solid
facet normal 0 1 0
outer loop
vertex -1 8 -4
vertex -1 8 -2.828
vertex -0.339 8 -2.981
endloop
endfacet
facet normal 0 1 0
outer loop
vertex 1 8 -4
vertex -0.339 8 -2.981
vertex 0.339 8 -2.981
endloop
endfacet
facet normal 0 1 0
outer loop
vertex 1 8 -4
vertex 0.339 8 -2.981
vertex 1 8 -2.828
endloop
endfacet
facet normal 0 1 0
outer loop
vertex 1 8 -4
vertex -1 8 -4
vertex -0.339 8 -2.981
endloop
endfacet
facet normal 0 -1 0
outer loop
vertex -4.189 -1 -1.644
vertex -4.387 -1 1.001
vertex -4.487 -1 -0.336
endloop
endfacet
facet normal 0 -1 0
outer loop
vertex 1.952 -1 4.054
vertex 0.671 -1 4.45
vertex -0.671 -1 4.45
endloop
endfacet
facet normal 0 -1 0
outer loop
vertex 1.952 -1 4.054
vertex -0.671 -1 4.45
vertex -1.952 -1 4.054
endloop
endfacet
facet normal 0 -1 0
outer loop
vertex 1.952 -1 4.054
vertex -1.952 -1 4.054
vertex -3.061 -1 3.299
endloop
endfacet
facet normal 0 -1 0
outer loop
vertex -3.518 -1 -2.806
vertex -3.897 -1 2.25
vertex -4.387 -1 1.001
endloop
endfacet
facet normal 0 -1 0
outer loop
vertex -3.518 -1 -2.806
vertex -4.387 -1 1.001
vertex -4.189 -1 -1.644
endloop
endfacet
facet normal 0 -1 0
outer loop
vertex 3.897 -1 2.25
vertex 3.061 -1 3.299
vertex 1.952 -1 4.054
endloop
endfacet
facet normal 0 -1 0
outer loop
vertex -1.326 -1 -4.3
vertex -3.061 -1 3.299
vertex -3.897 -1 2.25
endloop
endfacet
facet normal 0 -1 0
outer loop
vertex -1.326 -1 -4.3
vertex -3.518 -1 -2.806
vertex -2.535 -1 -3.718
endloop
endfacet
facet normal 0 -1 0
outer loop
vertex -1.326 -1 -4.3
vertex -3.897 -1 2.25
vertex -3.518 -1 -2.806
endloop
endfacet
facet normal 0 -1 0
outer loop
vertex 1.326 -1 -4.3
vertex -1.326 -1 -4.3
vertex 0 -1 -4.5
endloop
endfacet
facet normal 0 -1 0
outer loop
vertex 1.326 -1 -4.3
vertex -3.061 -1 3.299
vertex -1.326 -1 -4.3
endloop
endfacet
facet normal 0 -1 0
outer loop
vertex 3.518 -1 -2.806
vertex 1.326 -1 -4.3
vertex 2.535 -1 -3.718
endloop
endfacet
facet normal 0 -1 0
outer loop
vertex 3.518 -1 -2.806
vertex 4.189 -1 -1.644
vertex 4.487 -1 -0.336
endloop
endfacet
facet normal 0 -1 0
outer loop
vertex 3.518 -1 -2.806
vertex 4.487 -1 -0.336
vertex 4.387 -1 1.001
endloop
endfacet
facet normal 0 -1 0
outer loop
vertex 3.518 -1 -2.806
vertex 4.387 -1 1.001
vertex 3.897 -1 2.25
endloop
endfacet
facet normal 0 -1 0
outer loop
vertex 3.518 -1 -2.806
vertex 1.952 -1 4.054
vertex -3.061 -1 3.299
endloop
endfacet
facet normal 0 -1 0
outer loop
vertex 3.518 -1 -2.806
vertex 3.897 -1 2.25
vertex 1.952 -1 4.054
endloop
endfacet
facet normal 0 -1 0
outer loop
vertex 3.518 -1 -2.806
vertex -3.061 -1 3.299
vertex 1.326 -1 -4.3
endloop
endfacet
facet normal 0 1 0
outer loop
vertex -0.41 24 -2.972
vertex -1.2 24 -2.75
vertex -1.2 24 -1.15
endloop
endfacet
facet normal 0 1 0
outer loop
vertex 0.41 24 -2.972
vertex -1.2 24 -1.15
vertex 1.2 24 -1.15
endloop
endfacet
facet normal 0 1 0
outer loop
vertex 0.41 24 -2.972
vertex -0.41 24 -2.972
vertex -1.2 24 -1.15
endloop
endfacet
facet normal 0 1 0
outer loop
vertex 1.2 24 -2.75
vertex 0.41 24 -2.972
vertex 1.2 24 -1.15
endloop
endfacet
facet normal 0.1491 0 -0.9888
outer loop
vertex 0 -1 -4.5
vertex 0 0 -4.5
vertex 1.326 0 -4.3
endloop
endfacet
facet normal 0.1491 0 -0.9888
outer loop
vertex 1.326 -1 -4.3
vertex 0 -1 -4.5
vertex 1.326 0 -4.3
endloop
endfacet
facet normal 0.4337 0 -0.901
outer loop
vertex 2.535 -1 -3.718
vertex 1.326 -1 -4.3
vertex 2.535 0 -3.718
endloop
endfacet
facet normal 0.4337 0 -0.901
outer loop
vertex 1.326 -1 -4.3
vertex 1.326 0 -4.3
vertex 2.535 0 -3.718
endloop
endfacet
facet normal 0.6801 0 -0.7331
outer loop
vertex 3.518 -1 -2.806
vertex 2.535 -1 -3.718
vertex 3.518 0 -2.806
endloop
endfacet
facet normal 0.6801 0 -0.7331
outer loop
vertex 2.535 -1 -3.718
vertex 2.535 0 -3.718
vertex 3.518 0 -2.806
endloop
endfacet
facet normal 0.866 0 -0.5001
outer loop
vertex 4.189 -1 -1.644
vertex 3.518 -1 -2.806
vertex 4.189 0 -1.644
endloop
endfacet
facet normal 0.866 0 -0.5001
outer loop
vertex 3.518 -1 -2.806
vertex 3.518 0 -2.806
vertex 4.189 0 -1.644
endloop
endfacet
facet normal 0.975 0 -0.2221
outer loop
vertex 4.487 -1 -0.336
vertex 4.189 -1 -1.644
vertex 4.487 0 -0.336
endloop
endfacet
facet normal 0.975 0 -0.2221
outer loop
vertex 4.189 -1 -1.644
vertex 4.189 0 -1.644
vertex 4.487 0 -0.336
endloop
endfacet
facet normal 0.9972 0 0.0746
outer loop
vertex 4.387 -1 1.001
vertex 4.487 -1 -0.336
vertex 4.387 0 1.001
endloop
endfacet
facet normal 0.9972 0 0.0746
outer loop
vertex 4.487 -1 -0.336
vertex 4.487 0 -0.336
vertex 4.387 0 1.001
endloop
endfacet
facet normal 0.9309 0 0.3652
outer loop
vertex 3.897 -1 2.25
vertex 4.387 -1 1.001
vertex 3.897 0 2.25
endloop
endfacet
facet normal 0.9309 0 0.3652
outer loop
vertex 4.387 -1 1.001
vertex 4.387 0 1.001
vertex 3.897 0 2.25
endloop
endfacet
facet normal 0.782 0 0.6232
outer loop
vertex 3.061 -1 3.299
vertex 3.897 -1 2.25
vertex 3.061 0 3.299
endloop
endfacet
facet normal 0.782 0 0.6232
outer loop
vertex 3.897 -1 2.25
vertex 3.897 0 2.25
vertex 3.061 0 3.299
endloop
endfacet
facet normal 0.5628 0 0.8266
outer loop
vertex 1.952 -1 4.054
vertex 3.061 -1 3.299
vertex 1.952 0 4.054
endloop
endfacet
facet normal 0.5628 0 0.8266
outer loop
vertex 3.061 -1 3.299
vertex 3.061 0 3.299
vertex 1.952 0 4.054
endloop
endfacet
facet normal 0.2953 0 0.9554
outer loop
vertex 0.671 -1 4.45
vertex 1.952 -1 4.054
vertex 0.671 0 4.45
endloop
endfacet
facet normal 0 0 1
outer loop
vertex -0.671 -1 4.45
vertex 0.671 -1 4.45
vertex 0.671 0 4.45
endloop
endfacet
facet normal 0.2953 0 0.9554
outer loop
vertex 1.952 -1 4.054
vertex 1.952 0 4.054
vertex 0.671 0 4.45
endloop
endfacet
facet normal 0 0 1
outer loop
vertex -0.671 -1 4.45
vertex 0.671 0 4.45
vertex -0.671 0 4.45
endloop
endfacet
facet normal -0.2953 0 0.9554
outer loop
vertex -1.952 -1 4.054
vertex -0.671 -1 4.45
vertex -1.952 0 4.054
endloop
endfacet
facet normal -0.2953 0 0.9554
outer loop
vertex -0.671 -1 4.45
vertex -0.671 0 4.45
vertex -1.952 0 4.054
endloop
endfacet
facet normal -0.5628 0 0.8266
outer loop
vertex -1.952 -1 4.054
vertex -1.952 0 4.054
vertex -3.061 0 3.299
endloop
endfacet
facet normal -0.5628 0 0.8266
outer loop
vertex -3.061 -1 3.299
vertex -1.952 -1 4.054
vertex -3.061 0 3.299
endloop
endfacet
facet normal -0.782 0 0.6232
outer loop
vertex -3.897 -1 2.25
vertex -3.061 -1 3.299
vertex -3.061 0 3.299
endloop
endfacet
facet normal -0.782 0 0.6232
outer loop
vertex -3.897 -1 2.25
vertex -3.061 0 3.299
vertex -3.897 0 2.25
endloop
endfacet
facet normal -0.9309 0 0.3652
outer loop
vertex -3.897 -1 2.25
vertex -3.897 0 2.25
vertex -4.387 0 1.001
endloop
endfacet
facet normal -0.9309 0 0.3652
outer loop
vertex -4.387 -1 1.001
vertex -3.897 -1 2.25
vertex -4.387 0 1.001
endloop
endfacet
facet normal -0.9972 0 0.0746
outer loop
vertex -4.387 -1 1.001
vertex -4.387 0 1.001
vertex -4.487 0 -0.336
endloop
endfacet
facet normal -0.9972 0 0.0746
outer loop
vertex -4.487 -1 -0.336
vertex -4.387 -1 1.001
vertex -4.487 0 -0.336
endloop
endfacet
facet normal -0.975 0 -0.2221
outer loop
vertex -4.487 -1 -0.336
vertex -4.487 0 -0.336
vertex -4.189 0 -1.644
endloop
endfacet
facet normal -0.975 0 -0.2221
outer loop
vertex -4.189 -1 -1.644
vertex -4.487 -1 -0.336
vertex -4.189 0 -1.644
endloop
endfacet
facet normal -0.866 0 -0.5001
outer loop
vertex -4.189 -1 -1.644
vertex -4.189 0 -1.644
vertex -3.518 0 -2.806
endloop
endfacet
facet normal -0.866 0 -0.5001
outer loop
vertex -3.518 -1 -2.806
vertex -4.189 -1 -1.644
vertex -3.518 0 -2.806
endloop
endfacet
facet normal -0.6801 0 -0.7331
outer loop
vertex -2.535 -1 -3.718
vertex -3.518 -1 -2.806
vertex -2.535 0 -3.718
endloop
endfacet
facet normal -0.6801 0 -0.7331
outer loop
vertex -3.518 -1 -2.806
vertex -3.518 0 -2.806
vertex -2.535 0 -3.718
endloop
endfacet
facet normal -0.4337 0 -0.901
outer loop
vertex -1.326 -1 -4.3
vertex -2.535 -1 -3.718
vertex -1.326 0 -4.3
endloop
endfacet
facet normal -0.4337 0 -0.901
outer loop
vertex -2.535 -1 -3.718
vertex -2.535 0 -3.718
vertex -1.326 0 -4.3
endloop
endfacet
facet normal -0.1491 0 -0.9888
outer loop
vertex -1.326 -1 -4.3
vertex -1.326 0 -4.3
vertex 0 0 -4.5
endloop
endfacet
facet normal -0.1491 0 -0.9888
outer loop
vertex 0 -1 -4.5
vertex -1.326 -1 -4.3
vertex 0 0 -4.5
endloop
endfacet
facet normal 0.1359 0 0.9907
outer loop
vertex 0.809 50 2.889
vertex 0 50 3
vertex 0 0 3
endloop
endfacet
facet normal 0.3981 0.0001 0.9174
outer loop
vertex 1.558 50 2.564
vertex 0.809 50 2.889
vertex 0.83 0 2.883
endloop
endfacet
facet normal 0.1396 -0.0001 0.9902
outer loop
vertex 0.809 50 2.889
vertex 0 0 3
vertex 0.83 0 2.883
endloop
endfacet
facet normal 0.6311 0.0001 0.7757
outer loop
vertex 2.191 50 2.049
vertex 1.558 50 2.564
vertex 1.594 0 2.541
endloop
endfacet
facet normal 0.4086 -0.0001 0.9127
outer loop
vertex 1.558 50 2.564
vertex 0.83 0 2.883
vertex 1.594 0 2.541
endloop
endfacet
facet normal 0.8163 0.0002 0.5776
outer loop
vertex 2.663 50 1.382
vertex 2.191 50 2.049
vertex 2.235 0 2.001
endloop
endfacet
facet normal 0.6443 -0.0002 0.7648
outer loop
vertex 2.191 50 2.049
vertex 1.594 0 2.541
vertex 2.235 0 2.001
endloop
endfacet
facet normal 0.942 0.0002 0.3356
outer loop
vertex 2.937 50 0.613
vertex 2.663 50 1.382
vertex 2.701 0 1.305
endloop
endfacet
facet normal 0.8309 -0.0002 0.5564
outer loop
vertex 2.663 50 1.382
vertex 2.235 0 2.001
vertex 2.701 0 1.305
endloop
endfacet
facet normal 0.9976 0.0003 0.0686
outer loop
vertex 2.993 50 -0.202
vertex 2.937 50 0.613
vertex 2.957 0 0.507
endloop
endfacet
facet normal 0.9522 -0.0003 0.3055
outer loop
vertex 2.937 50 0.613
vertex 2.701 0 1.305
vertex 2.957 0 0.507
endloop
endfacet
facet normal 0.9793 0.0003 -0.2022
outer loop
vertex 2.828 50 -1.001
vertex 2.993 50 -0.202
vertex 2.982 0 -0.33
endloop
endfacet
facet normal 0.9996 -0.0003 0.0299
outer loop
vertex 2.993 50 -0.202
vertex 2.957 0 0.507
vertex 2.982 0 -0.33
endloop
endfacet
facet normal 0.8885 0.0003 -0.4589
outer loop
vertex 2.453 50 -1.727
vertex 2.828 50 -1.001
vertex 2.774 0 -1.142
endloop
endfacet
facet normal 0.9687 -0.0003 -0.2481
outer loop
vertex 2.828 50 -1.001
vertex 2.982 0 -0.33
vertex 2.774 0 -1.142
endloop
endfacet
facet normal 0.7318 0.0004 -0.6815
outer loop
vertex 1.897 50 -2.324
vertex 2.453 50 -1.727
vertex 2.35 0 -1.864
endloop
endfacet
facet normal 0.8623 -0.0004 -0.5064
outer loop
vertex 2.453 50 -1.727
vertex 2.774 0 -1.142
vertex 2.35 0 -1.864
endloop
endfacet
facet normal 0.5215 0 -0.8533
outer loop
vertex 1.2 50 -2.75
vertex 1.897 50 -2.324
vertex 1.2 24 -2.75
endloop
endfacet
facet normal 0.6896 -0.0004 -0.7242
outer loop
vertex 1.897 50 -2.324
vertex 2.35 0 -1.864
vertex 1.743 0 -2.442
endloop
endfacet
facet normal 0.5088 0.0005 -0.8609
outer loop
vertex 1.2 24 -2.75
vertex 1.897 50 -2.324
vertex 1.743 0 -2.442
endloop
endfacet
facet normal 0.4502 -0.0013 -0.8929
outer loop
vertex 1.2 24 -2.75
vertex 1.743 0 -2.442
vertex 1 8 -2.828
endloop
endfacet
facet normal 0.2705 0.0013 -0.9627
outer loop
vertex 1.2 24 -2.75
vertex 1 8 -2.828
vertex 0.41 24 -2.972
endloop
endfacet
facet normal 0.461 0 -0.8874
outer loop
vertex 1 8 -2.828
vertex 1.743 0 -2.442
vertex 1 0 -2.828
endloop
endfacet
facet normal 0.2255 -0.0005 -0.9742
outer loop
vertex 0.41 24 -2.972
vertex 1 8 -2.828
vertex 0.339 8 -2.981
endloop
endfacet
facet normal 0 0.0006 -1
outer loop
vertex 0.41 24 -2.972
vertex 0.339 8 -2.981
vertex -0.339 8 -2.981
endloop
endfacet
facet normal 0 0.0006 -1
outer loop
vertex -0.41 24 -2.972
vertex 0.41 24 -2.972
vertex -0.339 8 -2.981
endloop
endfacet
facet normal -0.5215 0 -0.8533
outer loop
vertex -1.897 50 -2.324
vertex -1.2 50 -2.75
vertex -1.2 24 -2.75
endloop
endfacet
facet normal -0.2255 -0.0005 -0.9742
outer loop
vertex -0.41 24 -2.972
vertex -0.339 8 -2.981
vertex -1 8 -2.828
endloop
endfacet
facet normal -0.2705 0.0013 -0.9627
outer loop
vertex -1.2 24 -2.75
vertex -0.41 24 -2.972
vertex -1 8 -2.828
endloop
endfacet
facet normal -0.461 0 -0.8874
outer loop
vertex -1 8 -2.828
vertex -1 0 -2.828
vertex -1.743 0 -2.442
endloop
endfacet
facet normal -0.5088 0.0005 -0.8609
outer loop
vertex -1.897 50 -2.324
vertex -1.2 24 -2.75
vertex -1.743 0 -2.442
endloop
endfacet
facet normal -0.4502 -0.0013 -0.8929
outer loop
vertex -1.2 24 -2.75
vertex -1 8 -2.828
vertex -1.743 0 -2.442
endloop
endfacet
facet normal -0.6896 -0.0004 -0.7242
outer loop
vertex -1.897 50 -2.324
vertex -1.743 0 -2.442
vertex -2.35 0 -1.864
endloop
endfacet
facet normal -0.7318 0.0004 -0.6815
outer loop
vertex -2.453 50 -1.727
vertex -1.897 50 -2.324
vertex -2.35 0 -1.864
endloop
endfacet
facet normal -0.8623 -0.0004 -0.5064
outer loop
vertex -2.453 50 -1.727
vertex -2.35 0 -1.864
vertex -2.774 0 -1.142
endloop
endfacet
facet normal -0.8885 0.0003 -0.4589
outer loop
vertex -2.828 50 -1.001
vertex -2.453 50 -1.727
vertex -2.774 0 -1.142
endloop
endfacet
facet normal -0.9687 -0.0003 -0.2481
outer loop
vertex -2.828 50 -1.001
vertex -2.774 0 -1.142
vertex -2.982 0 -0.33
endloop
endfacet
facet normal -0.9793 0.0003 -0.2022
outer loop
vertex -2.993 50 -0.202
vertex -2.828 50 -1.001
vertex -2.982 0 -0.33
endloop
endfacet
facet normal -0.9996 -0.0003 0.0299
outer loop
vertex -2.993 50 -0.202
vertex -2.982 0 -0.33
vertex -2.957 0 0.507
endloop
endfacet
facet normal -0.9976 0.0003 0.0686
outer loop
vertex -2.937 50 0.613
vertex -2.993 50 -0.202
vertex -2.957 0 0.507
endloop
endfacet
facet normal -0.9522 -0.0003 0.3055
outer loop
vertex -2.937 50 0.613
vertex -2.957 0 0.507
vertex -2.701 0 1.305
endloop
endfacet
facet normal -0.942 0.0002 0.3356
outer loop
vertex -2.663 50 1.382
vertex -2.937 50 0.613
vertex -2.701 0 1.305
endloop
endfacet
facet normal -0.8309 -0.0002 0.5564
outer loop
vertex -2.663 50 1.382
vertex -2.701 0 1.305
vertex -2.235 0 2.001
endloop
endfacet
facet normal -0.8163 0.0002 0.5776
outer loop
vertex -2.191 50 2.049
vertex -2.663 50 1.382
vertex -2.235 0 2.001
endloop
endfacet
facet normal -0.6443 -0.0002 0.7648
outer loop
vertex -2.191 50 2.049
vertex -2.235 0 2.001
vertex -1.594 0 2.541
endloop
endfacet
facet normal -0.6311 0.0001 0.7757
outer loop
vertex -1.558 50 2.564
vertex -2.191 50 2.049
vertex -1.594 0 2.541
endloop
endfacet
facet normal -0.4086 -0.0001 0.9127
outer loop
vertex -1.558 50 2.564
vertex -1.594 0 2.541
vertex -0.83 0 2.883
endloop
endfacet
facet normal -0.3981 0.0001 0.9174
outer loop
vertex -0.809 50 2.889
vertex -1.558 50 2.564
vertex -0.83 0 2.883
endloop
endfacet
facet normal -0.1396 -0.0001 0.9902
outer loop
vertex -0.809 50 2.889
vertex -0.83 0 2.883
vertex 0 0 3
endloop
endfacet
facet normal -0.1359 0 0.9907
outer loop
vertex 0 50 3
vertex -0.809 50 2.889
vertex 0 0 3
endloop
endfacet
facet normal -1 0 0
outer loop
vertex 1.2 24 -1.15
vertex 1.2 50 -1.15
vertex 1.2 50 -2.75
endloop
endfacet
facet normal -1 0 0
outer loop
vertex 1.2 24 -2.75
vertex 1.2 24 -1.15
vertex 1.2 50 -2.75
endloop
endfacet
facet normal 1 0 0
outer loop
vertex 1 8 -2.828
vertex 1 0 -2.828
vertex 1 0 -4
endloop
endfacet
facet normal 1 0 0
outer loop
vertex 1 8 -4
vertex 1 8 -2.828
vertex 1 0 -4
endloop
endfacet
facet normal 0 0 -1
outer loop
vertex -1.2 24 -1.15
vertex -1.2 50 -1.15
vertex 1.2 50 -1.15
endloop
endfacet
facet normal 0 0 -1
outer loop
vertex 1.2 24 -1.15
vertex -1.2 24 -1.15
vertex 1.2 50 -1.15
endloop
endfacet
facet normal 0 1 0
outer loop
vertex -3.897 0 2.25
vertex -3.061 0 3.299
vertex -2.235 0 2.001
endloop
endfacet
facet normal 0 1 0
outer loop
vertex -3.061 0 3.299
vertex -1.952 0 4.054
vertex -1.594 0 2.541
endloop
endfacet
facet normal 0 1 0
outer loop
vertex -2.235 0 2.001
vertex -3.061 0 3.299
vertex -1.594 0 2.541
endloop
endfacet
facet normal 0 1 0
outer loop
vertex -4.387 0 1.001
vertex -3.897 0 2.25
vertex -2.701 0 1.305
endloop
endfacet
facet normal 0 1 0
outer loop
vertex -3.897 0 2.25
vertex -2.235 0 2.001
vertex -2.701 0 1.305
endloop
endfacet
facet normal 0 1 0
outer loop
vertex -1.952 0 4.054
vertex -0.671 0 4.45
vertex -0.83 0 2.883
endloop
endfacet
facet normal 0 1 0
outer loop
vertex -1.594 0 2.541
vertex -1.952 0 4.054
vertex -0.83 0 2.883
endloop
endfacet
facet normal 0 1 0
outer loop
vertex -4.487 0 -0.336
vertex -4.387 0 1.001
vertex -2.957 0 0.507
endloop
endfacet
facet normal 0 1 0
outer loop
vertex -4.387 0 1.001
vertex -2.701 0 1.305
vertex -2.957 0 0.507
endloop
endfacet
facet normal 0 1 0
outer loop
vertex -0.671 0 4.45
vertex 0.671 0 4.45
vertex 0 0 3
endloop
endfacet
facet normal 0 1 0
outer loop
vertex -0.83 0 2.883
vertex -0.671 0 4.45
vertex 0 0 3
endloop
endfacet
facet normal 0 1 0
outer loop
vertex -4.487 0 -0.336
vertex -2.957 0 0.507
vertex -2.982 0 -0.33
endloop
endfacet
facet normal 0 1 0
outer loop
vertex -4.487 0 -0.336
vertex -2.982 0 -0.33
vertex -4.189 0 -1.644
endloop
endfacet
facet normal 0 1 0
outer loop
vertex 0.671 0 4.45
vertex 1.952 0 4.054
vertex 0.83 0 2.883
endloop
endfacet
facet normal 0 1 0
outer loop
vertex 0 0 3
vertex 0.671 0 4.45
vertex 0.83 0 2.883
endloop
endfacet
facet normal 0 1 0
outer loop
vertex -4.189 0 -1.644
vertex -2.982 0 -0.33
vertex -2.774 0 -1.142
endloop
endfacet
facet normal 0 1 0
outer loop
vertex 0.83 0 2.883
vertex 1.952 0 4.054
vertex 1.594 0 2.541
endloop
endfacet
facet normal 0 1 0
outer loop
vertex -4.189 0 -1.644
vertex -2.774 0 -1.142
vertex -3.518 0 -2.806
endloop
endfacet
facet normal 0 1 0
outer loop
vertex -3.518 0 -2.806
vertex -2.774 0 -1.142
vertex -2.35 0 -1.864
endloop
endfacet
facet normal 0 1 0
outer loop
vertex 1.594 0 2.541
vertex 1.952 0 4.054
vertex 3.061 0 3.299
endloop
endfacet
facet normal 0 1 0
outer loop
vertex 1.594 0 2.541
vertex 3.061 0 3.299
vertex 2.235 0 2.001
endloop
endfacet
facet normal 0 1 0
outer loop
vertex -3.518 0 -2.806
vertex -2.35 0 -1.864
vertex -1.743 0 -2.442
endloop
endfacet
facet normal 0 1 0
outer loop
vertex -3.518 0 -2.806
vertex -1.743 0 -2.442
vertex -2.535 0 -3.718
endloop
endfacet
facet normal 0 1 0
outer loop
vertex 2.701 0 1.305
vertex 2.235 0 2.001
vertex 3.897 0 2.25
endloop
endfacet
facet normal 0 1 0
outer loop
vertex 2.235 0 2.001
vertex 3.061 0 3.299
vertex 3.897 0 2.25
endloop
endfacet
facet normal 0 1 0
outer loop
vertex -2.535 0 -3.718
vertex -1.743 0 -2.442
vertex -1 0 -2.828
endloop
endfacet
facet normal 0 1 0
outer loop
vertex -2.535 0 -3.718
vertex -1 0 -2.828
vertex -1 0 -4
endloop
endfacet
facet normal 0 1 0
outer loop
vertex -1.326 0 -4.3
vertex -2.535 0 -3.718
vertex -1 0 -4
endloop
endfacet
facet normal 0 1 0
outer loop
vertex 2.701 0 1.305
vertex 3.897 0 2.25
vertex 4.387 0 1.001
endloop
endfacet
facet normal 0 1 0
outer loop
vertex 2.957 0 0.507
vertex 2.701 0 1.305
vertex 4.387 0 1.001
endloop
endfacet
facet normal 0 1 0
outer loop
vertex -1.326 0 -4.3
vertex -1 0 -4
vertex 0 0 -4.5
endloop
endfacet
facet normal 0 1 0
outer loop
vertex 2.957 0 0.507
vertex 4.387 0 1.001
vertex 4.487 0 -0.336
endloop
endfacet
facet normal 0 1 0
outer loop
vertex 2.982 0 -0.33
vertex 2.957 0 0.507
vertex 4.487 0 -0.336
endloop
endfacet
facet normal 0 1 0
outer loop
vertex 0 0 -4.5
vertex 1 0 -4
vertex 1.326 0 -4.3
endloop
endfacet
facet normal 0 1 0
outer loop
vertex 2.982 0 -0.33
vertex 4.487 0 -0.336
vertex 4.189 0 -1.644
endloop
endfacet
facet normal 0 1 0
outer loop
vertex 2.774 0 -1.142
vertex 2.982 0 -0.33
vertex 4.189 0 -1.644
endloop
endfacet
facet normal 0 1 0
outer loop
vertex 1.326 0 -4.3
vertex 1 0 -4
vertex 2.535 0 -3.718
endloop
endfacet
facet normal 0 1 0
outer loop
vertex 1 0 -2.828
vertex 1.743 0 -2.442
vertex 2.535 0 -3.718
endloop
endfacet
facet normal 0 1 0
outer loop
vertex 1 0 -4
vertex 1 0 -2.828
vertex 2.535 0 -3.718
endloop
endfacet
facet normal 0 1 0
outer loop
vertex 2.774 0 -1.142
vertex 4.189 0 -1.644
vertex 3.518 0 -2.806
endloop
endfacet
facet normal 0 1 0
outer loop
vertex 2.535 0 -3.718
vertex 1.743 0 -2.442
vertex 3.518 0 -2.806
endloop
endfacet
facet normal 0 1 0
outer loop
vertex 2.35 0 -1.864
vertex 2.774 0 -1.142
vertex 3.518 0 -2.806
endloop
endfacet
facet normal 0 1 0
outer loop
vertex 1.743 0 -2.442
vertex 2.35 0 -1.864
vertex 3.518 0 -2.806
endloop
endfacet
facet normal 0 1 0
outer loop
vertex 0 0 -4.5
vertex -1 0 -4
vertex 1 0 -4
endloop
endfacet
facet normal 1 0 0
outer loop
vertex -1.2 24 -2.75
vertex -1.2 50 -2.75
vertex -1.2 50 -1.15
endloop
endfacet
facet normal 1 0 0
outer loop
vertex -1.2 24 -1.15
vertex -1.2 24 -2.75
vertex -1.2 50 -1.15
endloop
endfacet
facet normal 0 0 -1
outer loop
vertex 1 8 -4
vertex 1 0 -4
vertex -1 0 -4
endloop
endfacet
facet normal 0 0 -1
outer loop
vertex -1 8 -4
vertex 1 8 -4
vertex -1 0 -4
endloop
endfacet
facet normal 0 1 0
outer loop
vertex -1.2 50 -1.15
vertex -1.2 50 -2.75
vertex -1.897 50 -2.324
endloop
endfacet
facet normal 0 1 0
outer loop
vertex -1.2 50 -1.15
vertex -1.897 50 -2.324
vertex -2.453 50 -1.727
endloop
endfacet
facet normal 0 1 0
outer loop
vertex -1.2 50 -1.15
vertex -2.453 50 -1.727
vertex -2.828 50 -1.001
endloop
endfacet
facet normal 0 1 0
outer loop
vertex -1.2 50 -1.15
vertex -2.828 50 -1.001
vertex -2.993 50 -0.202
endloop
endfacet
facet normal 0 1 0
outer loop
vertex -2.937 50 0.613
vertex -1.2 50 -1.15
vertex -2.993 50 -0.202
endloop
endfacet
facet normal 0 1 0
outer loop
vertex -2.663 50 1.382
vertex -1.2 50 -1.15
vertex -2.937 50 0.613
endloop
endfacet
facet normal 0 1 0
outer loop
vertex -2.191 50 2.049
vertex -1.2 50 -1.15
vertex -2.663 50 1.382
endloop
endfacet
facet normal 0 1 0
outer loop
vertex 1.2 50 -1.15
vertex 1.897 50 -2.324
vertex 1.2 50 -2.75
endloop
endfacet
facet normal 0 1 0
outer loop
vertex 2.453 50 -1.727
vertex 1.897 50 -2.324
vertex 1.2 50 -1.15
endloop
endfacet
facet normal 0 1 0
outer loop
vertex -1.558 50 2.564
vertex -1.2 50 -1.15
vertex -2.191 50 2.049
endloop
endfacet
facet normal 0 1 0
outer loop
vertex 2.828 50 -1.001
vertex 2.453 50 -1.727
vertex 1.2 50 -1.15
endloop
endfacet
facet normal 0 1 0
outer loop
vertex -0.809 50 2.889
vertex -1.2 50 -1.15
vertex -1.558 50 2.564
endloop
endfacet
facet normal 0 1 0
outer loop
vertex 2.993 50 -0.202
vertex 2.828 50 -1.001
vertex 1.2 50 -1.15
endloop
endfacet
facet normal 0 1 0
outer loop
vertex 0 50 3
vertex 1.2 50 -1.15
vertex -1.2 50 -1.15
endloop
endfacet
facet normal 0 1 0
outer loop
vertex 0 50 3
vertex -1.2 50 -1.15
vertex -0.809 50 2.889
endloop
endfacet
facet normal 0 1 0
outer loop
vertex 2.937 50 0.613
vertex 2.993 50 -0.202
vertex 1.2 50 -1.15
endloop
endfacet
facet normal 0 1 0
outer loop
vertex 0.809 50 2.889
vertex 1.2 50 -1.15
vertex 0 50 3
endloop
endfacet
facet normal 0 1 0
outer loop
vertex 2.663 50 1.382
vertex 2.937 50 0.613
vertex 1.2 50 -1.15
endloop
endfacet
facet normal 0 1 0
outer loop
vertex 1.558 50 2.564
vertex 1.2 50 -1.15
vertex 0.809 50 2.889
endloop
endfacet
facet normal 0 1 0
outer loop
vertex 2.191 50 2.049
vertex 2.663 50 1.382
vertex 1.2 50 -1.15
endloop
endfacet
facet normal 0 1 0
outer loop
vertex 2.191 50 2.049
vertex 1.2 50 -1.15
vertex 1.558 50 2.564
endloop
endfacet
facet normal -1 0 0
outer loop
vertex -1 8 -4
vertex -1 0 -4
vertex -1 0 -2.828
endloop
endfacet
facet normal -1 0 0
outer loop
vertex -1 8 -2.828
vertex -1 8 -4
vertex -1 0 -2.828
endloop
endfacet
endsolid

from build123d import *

# Parameters (mm, degrees)
EXTRUDE_2_DEPTH     = 50
EXTRUDE_3_DEPTH     = 8
CUT_EXTRUDE_1_DEPTH = 26
SKETCH_3_R          = 4.5
EXTRUDE_4_DEPTH     = 1


with BuildPart() as part:
    # 스케치1 → 보스-돌출2 (new body)
    with BuildSketch(Plane(origin=(0, 0, 0), x_dir=(1, 0, 0), z_dir=(0, 1, 0))):
        with BuildLine():
            ThreePointArc((1, 2.828427125), (0, 3), (-1, 2.828427125))
            ThreePointArc((-1, 2.828427125), (-1.732050808, -2.449489743), (3, 0))
            ThreePointArc((3, 0), (2.449489743, 1.732050808), (1, 2.828427125))
        make_face()
    extrude(amount=EXTRUDE_2_DEPTH)

    # 스케치1<3> → 보스-돌출3 (add)
    with BuildSketch(Plane(origin=(0, 0, 0), x_dir=(1, 0, 0), z_dir=(0, 1, 0))):
        with BuildLine():
            Line((-1, 4), (-1, 2.828427125))
            ThreePointArc((-1, 2.828427125), (0, 3), (1, 2.828427125))
            Line((1, 2.828427125), (1, 4))
            Line((1, 4), (-1, 4))
        make_face()
    extrude(amount=EXTRUDE_3_DEPTH)

    # 스케치2 → 컷-돌출1 (cut)
    with BuildSketch(Plane(origin=(0, 50, 0), x_dir=(1, 0, 0), z_dir=(0, 1, 0))):
        Polygon((-1.2, 1.149545417), (1.2, 1.149545417), (1.2, 2.749545417), (0, 4.828006386), (-1.2, 2.749545417), align=None)
    extrude(amount=-CUT_EXTRUDE_1_DEPTH, mode=Mode.SUBTRACT)

    # 스케치3 → 보스-돌출4 (add)
    with BuildSketch(Plane.XZ):
        Circle(SKETCH_3_R)
    extrude(amount=EXTRUDE_4_DEPTH)


solid = part.part
